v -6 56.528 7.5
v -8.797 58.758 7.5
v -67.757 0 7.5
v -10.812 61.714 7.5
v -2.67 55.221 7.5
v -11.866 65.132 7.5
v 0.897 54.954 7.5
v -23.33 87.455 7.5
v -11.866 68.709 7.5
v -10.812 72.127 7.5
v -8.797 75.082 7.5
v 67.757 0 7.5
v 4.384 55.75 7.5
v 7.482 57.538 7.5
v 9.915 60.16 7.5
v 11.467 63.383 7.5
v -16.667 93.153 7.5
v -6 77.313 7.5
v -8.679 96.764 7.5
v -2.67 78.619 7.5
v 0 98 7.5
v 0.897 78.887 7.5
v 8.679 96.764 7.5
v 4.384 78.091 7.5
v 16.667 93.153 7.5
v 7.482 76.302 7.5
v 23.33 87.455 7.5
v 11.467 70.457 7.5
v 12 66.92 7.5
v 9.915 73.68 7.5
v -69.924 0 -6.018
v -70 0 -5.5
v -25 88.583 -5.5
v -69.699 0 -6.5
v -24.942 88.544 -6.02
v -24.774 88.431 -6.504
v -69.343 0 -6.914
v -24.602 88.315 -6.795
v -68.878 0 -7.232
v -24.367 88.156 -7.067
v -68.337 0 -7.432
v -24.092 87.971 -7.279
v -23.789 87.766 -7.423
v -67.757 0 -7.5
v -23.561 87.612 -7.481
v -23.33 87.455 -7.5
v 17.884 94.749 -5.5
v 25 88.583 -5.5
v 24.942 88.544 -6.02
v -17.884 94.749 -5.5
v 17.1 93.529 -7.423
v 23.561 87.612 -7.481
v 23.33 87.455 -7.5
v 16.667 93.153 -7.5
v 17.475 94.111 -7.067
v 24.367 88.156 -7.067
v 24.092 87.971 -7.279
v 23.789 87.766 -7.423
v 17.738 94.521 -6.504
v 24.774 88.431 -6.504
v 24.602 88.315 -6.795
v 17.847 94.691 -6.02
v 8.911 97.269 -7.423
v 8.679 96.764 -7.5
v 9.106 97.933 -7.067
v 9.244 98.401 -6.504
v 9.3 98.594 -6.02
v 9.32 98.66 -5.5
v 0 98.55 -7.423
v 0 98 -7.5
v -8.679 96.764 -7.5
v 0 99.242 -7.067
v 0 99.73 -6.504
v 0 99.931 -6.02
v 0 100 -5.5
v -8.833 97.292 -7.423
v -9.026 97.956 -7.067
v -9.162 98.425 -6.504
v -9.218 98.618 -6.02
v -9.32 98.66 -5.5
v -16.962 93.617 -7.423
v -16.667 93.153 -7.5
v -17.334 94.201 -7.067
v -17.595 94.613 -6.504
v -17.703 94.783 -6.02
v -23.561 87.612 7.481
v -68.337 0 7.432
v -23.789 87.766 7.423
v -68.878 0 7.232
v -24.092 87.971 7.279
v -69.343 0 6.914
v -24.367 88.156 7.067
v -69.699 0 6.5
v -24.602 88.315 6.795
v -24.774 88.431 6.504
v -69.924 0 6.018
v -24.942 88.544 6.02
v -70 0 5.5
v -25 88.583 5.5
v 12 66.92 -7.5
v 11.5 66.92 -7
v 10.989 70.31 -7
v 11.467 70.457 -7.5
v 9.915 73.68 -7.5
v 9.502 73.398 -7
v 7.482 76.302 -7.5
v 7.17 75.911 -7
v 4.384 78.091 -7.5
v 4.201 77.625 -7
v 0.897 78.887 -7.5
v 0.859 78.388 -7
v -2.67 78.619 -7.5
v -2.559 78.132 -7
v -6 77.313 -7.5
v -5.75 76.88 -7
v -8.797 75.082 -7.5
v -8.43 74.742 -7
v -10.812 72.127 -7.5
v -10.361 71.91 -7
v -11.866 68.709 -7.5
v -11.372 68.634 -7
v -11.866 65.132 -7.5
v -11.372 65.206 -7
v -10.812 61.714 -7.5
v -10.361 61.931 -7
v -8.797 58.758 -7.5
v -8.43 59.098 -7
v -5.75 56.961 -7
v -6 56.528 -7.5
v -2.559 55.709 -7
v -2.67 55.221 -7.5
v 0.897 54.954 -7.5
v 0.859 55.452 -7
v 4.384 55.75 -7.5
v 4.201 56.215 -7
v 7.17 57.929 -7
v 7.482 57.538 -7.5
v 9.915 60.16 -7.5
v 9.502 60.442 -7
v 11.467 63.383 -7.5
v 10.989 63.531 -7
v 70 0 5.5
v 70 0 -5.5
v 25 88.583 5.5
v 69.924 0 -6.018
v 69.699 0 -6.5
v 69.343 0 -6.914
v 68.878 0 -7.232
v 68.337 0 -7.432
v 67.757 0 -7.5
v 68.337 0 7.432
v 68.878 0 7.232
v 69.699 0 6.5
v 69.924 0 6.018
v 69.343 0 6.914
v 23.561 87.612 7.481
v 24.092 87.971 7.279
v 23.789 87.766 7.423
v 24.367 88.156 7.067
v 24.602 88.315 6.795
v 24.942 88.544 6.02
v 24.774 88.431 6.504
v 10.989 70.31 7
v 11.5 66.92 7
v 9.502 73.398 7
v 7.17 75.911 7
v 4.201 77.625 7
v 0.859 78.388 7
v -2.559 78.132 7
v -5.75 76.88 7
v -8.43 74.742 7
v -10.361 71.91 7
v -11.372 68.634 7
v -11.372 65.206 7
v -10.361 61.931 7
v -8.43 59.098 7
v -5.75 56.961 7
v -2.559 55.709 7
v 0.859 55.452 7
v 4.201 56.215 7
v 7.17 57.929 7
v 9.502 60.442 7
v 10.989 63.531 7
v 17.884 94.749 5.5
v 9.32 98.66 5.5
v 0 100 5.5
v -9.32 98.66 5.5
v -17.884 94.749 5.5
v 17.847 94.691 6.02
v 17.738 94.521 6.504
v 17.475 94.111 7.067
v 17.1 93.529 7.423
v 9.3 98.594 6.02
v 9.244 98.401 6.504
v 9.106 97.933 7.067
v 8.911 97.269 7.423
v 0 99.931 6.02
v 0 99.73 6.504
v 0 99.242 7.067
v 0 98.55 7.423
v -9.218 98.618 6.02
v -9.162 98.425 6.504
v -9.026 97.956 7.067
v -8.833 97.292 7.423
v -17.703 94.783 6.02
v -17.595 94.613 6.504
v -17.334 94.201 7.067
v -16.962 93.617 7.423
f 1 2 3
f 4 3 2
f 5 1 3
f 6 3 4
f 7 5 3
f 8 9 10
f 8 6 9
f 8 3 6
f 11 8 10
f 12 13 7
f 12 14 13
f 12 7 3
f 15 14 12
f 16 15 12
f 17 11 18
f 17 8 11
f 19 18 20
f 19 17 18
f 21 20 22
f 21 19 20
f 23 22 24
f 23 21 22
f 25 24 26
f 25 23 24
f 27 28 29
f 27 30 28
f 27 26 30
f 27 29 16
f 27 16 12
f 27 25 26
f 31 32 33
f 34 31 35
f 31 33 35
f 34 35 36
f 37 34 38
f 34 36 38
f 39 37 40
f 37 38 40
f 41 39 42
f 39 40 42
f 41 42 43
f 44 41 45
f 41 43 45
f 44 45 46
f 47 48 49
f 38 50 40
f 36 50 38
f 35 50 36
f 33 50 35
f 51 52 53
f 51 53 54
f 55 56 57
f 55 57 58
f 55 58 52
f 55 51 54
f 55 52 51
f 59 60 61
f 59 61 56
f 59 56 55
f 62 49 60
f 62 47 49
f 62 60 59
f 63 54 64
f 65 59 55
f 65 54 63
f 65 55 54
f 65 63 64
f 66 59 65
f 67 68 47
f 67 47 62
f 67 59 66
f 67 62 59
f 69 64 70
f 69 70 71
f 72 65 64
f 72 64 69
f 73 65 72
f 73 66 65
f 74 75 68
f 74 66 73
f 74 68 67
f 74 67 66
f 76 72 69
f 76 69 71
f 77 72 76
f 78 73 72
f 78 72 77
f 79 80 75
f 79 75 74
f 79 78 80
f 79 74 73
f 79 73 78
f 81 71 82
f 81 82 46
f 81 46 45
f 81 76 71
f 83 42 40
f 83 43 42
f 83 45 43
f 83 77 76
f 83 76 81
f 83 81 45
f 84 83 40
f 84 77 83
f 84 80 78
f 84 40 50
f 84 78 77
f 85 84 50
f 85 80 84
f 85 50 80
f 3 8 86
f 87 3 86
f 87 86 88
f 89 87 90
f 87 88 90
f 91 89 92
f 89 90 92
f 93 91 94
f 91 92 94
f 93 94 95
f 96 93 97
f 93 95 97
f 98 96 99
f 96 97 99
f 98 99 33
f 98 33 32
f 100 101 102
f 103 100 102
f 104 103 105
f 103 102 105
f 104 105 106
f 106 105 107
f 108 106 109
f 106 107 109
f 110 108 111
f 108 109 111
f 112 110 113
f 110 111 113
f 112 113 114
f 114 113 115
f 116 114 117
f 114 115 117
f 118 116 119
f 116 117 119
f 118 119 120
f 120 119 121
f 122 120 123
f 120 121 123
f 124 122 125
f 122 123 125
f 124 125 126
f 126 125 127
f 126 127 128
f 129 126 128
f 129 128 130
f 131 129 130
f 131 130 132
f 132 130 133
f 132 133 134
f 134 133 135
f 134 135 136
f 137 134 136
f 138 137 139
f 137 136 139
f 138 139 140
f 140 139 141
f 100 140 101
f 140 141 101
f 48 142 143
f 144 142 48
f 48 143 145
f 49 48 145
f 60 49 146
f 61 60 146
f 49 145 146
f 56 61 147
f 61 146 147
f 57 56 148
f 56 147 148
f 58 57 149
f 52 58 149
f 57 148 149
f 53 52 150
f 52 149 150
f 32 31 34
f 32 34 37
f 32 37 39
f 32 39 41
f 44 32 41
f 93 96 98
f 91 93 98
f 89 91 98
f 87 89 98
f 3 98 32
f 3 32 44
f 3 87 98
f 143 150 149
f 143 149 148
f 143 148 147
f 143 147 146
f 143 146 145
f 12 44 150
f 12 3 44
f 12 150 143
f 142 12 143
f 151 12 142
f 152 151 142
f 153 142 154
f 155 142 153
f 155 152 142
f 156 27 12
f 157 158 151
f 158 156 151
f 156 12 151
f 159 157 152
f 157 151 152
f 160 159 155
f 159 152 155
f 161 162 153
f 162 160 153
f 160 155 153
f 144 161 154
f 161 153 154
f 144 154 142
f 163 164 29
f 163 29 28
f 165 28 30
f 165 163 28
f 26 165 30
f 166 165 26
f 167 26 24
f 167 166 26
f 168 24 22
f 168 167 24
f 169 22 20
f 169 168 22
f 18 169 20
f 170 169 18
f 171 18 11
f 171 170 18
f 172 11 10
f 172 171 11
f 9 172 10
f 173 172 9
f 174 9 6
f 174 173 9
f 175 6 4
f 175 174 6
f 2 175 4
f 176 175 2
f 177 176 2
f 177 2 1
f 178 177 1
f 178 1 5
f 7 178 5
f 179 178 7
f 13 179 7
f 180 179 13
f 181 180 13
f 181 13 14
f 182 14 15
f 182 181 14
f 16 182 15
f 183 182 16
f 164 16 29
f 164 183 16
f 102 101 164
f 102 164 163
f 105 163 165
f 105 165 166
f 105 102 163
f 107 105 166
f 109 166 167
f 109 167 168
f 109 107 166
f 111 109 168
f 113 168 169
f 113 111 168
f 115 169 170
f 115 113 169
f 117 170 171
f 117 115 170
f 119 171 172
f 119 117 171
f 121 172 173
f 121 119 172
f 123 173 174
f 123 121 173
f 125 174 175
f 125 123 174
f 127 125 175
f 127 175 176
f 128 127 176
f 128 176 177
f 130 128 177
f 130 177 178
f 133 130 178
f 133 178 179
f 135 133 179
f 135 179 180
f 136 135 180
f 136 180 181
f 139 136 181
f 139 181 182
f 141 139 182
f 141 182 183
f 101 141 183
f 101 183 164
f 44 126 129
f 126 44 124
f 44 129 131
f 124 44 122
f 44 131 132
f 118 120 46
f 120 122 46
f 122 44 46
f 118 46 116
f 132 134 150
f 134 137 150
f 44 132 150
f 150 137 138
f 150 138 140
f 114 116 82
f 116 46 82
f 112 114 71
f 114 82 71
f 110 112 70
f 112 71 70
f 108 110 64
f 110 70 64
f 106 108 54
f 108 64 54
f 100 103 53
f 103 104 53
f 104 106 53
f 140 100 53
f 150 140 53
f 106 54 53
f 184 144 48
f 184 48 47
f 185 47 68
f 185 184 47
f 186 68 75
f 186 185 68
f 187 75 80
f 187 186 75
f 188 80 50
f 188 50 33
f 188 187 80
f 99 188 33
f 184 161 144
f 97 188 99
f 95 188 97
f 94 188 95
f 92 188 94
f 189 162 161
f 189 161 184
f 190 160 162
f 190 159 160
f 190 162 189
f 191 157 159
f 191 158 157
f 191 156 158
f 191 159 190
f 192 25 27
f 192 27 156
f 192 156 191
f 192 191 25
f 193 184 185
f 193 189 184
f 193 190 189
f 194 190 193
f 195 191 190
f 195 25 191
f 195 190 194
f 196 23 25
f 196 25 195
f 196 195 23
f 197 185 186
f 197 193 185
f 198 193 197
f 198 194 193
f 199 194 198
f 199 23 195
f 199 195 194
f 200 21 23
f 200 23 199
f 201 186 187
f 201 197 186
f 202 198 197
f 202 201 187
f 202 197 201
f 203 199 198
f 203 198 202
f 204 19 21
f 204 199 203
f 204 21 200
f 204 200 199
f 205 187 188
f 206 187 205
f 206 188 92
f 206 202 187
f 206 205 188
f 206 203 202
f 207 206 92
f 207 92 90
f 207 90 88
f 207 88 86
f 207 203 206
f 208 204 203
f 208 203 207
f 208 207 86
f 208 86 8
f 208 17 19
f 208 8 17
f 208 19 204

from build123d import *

# Parameters (mm, degrees)
SKETCH1_R           = 11.5
BOSS_EXTRUDE1_DEPTH = 7.5
FILLET1_R           = 2
CHAMFER1_SIZE       = 0.5


with BuildPart() as part:
    # Sketch1 → Boss-Extrude1 (new, symmetric)
    with BuildSketch(Plane.XY):
        with BuildLine():
            Line((-70, 0), (70, 0))
            Line((70, 0), (25, 88.582893039))
            ThreePointArc((25, 88.582893039), (0, 100), (-25, 88.582893039))
            Line((-25, 88.582893039), (-70, 0))
        make_face()
        with Locations((0, 66.920239342)):
            Circle(SKETCH1_R, mode=Mode.SUBTRACT)
    extrude(amount=BOSS_EXTRUDE1_DEPTH, both=True)

    # Fillet1
    # the kernel refuses this fillet: 2 mm, written as the material it takes off along each edge
    with BuildSketch(Plane(origin=(72.264547882, -4.457782284, 7.5), x_dir=(0, 0, -1), z_dir=(-0.45290957632946743, 0.8915564568040896, 0)), Plane(origin=(-22.735452118, 93.040675323, 7.5), x_dir=(0, 0, -1), z_dir=(-0.45290957632946743, -0.8915564568040896, 0))) as fillet1_piece_1:
        with BuildLine():
            CenterArc((FILLET1_R, FILLET1_R), FILLET1_R, 180, 90)
            Line((0, FILLET1_R), (0, 0))
            Line((0, 0), (FILLET1_R, 0))
        make_face()
    extrude(amount=109.357581186, mode=Mode.SUBTRACT)
    with BuildSketch(Plane(origin=(0, 66.920239342, 7.5), x_dir=(0.8457767754384001, 0.5335369210551618, 0), z_dir=(0.5335369210551618, -0.8457767754384001, 0))) as fillet1_piece_2:
        with BuildLine():
            CenterArc((33.079760658 - FILLET1_R, -FILLET1_R), FILLET1_R, 0, 90)
            Line((33.079760658 - FILLET1_R, 0), (33.079760658, 0))
            Line((33.079760658, 0), (33.079760658, -FILLET1_R))
        make_face()
    revolve(axis=Axis((0, 66.920239342, 7.5), (0, 0, 1)), revolution_arc=115.510513381, mode=Mode.SUBTRACT)
    with BuildSketch(Plane(origin=(0, 66.920239342, -7.5), x_dir=(0.8457767754384001, 0.5335369210551618, 0), z_dir=(0.5335369210551618, -0.8457767754384001, 0))) as fillet1_piece_3:
        with BuildLine():
            CenterArc((33.079760658 - FILLET1_R, FILLET1_R), FILLET1_R, 270, 90)
            Line((33.079760658 - FILLET1_R, 0), (33.079760658, 0))
            Line((33.079760658, 0), (33.079760658, FILLET1_R))
        make_face()
    revolve(axis=Axis((0, 66.920239342, -7.5), (0, 0, 1)), revolution_arc=115.510513381, mode=Mode.SUBTRACT)
    with BuildSketch(Plane(origin=(72.264547882, -4.457782284, -7.5), x_dir=(0, 0, 1), z_dir=(-0.45290957632946743, 0.8915564568040896, 0)), Plane(origin=(-22.735452118, 93.040675323, -7.5), x_dir=(0, 0, 1), z_dir=(-0.45290957632946743, -0.8915564568040896, 0))) as fillet1_piece_4:
        with BuildLine():
            CenterArc((FILLET1_R, -FILLET1_R), FILLET1_R, 90, 90)
            Line((0, -FILLET1_R), (0, 0))
            Line((0, 0), (FILLET1_R, 0))
        make_face()
    extrude(amount=109.357581186, mode=Mode.SUBTRACT)

    # Chamfer1
    chamfer1_edges = [part.edges().sort_by_distance(p)[0] for p in [
        (-11.5, 66.920239342, -7.5),
        (-11.5, 66.920239342, 7.5),
    ]]
    chamfer(chamfer1_edges, length=CHAMFER1_SIZE)


solid = part.part
